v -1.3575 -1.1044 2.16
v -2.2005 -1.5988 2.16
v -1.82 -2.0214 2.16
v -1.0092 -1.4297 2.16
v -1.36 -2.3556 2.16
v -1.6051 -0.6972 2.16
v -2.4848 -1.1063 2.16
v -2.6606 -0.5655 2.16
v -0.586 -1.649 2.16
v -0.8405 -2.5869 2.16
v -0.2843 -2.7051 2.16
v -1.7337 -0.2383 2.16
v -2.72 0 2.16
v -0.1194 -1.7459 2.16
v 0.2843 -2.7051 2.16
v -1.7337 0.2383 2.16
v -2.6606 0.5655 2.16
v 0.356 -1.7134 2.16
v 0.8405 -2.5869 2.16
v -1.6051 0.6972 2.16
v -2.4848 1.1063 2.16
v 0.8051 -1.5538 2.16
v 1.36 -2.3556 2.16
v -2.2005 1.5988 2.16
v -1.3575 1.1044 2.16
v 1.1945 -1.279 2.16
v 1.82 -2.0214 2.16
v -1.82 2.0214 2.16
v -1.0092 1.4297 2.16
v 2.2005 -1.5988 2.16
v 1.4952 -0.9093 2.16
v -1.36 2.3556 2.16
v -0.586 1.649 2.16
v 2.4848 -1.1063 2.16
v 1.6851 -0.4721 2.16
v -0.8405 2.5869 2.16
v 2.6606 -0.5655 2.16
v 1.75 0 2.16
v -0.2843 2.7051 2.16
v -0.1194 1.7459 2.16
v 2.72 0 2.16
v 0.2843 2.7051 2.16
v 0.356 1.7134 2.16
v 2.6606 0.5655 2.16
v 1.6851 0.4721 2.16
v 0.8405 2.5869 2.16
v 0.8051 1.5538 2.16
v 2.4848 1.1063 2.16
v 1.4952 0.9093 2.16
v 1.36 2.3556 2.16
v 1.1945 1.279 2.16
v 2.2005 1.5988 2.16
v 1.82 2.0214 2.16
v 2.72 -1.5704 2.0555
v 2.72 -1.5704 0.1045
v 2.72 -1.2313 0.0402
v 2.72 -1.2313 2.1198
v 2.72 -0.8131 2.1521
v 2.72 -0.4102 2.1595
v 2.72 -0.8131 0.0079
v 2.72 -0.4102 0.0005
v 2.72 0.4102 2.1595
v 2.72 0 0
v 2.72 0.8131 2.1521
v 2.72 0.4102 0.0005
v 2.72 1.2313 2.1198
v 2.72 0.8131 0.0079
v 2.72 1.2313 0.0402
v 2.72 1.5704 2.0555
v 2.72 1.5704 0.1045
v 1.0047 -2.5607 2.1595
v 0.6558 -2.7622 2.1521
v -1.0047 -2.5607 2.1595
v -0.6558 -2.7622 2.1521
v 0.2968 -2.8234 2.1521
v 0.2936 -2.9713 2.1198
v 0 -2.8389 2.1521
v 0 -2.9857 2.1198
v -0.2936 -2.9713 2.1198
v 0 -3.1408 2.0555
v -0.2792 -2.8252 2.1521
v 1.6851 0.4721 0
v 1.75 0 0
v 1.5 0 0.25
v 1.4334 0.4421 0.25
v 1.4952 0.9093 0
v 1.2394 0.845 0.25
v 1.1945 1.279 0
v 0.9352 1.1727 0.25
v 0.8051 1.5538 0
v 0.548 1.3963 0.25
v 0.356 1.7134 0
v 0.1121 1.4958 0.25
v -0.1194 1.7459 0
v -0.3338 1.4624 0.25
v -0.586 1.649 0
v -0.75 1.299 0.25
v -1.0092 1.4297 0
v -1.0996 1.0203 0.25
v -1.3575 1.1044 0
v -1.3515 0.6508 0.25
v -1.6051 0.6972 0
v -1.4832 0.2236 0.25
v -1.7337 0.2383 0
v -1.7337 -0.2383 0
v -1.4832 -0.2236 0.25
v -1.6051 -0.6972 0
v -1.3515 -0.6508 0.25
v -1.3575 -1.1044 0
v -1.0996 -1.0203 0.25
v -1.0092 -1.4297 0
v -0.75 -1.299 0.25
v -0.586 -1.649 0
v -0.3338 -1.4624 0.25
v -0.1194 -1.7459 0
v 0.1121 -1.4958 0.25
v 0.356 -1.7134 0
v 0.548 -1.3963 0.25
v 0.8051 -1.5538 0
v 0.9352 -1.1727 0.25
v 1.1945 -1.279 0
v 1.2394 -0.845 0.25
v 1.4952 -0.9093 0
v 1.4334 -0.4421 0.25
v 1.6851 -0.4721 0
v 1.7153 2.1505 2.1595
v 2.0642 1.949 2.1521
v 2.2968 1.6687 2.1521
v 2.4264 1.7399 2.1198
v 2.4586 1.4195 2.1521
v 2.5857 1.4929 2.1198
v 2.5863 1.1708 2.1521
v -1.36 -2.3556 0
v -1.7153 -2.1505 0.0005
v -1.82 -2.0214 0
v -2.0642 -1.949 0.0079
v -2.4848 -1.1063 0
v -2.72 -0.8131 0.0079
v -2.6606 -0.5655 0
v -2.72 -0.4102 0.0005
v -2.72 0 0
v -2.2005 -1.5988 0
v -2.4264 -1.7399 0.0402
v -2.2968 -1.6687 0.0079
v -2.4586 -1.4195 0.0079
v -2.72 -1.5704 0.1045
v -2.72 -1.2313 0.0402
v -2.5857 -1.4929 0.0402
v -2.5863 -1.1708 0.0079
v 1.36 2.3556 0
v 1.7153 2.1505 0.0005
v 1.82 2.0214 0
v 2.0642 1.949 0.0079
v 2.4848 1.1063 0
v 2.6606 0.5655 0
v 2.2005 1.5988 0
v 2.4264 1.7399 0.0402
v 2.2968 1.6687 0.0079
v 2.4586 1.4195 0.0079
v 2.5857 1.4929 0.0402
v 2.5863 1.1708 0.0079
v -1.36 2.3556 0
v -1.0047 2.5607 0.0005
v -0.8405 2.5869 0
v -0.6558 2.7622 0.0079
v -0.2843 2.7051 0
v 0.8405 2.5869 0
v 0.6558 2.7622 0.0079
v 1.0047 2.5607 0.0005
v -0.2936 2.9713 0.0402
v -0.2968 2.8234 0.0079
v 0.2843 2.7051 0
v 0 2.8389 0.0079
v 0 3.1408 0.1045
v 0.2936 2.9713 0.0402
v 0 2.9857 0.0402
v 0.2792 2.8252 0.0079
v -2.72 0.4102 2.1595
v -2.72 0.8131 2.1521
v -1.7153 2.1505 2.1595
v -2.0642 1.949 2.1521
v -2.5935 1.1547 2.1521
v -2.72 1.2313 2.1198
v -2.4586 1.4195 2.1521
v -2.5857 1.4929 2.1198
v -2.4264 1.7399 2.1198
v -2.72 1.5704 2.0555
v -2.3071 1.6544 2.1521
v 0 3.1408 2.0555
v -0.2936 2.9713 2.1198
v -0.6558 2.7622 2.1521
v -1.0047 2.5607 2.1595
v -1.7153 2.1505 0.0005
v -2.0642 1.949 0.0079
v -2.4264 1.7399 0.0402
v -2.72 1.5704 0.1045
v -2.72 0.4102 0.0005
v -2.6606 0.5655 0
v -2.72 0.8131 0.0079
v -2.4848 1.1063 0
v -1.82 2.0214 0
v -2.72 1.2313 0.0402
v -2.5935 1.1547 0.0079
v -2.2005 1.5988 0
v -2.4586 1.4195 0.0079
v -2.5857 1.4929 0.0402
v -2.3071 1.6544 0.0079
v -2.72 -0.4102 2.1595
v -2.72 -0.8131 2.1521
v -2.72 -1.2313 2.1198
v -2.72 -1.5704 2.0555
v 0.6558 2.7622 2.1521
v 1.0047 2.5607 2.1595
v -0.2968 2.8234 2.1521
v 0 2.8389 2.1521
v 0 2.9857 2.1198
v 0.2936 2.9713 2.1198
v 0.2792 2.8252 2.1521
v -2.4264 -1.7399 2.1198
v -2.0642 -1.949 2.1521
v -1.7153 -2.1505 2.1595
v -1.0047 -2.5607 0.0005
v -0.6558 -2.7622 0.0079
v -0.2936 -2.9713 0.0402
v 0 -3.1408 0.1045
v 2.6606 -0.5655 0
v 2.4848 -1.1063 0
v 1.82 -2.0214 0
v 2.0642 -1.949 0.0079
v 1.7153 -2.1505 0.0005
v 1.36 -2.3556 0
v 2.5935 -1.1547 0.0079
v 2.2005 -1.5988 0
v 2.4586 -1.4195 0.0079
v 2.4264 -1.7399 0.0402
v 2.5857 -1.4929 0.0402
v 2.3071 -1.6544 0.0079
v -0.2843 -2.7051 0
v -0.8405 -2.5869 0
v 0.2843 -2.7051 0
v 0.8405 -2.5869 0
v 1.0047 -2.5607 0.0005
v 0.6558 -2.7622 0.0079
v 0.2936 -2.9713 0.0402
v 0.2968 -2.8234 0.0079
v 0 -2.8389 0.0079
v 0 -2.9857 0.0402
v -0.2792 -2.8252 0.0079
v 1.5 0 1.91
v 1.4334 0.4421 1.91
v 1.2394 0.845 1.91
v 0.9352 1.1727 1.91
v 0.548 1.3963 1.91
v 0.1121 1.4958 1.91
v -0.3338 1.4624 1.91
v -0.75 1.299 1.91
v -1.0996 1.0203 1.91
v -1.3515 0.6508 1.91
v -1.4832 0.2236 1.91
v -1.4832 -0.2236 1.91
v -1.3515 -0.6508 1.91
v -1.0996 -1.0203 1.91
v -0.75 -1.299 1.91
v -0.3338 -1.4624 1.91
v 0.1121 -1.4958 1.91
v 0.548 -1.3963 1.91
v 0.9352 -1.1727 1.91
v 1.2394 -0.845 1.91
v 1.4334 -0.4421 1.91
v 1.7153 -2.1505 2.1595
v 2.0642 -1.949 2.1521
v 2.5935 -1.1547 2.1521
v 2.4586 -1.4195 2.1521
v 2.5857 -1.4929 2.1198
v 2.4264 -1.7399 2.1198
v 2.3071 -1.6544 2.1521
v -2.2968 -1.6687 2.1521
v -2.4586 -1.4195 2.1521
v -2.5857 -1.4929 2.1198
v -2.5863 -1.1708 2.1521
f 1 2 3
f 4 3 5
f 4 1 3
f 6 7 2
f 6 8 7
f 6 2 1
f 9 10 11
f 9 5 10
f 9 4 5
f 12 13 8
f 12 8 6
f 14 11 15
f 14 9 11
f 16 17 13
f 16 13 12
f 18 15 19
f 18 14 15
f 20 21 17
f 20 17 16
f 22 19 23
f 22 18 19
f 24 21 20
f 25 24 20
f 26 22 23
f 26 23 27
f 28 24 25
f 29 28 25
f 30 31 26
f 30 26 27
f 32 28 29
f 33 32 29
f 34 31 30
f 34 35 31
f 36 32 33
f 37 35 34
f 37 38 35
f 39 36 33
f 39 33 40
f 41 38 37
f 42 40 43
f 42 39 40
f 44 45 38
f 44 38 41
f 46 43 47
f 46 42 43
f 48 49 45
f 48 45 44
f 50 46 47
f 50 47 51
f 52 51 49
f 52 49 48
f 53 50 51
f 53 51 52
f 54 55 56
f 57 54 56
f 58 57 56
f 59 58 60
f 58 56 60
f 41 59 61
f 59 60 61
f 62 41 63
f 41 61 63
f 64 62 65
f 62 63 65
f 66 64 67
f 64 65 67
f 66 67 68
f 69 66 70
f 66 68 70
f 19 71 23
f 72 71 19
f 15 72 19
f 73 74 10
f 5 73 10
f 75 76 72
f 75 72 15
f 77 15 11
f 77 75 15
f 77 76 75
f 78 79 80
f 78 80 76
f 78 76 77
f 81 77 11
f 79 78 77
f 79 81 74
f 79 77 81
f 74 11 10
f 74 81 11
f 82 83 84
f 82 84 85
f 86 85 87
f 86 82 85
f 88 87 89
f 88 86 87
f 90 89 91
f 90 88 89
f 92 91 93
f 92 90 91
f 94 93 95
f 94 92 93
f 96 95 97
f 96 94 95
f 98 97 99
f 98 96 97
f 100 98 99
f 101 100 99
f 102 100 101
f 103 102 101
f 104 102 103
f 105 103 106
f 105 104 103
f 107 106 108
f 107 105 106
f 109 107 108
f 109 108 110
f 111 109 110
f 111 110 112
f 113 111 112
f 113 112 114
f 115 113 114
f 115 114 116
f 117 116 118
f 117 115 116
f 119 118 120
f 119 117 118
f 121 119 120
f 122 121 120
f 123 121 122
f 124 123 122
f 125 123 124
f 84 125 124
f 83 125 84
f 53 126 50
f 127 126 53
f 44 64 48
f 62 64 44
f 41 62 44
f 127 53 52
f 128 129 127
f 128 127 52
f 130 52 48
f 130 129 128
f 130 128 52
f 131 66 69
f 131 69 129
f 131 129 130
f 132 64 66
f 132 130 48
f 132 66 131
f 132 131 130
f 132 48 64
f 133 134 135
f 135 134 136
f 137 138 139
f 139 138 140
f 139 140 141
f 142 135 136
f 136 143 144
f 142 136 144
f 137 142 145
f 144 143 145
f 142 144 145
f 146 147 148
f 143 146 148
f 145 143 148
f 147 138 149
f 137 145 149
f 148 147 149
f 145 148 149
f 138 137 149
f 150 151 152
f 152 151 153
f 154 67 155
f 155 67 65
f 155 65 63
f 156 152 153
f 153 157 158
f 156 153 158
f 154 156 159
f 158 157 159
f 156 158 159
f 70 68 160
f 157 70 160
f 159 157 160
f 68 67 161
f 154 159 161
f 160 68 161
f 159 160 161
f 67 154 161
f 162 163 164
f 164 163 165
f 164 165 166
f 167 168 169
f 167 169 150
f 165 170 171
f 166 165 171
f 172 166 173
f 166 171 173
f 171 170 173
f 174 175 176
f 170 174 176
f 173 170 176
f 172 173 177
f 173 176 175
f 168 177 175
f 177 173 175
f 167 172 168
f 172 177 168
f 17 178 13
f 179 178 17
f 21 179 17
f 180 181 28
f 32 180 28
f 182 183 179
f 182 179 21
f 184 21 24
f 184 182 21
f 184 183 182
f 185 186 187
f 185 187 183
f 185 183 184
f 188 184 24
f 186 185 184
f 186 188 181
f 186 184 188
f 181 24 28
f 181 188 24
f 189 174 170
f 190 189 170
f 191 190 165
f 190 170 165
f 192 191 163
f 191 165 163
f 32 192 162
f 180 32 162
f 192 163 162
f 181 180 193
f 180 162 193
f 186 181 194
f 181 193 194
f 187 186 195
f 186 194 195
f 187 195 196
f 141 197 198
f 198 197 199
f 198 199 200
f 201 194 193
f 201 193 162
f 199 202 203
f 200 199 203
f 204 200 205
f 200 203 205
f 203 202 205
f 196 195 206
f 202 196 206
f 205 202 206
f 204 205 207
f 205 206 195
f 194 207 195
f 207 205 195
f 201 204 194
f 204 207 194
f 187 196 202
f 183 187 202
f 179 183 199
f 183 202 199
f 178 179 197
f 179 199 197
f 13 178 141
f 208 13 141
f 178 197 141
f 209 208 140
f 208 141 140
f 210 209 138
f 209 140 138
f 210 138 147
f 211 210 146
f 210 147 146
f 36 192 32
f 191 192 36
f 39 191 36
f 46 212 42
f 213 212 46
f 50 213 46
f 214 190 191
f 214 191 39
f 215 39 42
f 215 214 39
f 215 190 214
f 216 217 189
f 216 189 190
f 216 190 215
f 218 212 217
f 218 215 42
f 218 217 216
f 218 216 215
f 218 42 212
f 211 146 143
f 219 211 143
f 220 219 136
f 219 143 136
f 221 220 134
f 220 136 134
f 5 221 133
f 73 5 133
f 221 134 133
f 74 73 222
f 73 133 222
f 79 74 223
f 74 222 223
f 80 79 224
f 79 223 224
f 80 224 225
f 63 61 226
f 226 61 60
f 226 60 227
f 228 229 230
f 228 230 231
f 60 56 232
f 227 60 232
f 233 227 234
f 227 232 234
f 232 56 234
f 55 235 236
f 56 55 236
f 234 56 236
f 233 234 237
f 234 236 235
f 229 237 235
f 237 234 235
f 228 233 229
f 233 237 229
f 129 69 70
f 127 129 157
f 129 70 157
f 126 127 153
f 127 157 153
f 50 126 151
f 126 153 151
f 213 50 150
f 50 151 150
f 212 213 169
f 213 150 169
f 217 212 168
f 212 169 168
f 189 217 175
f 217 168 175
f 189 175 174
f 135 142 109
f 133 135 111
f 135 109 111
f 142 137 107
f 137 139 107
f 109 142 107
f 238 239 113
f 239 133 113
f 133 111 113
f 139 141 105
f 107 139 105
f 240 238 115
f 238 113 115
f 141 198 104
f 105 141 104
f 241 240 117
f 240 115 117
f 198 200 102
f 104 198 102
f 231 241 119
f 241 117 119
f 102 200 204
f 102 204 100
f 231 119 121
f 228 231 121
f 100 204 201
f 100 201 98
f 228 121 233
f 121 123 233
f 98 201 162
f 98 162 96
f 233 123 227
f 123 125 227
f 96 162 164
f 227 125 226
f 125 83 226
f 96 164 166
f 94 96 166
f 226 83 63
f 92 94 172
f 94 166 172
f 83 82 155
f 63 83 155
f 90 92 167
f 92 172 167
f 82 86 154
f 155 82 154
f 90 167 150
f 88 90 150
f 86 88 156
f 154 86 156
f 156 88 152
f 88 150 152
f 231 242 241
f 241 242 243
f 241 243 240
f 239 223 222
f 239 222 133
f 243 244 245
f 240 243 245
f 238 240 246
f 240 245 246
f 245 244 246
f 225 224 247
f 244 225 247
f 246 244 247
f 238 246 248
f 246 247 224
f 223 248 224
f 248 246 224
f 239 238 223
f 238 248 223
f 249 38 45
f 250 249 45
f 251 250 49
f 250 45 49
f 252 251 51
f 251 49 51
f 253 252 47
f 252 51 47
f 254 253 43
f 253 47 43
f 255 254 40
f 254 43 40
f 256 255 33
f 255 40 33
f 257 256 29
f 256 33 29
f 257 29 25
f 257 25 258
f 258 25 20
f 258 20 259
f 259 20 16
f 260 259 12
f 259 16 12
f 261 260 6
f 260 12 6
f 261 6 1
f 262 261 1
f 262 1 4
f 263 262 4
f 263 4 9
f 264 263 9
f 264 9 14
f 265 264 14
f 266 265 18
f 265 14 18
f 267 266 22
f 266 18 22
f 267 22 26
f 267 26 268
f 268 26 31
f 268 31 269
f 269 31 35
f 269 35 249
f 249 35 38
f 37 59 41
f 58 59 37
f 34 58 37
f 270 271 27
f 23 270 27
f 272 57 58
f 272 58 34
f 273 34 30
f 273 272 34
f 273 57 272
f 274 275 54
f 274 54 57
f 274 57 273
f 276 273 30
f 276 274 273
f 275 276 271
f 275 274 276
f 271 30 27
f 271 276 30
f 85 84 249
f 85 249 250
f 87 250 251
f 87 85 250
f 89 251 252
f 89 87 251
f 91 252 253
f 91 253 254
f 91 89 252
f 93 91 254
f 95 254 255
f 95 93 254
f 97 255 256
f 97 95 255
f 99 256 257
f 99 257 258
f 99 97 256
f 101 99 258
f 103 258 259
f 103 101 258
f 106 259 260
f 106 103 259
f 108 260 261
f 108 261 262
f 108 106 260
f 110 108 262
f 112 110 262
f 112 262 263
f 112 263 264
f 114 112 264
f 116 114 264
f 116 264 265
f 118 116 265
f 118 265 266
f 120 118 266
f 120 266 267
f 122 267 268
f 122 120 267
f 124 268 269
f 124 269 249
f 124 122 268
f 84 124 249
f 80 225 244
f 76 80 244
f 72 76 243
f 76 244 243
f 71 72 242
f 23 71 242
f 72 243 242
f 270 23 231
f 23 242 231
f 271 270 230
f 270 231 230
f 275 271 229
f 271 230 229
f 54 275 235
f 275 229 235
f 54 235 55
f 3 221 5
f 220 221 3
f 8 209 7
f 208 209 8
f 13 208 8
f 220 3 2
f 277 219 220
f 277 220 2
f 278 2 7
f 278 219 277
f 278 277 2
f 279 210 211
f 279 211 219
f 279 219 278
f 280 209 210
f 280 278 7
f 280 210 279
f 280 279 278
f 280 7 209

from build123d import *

# Parameters (mm, degrees)
SKETCH1_R           = 1.5
BOSS_EXTRUDE1_DEPTH = 2.16
CHAMFER1_SIZE       = 0.25


with BuildPart() as part:
    # Sketch1 → Boss-Extrude1 (new body)
    with BuildSketch(Plane.XY):
        Polygon((2.72, 1.570392732), (0, 3.140785464), (-2.72, 1.570392732), (-2.72, -1.570392732), (0, -3.140785464), (2.72, -1.570392732), align=None)
        Circle(SKETCH1_R, mode=Mode.SUBTRACT)
    extrude(amount=BOSS_EXTRUDE1_DEPTH)

    # Chamfer1
    chamfer1_edges = [part.edges().sort_by_distance(p)[0] for p in [
        (-1.5, 0, 0),
        (-1.5, 0, 2.16),
    ]]
    chamfer(chamfer1_edges, length=CHAMFER1_SIZE)

    # Sketch2 → Cut-Revolve1 (revolve, cut)
    with BuildSketch(Plane(origin=(0, 0, 0), x_dir=(1, 0, 0), z_dir=(0, 1, 0))):
        with BuildLine():
            Line((-3.580128719, -0.636846199), (-4.500819954, -0.636846199))
            Line((-4.500819954, -0.636846199), (-4.500819954, 0.361239255))
            Line((-4.500819954, 0.361239255), (-2.72, 0.361239255))
            Line((-2.72, 0.361239255), (-2.72, 0))
            ThreePointArc((-2.72, 0), (-3.255115524, -0.176540297), (-3.580128719, -0.636846199))
        make_face()
        with BuildLine():
            Line((-2.72, -2.521239255), (-2.72, -2.16))
            ThreePointArc((-2.72, -2.16), (-3.255115524, -1.983459703), (-3.580128719, -1.523153801))
            Line((-3.580128719, -1.523153801), (-4.500819954, -1.523153801))
            Line((-4.500819954, -1.523153801), (-4.500819954, -2.521239255))
            Line((-4.500819954, -2.521239255), (-2.72, -2.521239255))
        make_face()
    revolve(axis=Axis((0, 0, 1.08), (0, 0, -1)), mode=Mode.SUBTRACT)


solid = part.part
